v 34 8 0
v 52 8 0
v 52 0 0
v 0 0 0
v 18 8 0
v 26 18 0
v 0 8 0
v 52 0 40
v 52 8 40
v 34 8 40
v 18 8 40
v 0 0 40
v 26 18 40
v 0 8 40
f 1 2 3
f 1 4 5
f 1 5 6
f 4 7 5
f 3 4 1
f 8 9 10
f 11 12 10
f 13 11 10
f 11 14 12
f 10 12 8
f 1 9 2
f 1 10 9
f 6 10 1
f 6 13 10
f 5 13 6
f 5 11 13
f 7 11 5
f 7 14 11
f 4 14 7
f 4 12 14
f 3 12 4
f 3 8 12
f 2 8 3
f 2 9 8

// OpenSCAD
$fn = 32;

// ----------------------------------------------------------------------
// V guide rail: vrib, 52 mm wide
// ----------------------------------------------------------------------

// --- parameters (mm) ---
rail_w = 52;              // rail width, X
base_t = 8;               // base plate thickness
v_depth = 10;             // V feature depth / height
v_half_w = 8;             // half width of the V at the base face
plate_t = 40;             // rail length, Z (the extrusion height)

profile = [[0, 0], [52, 0], [52, 8], [34, 8], [26, 18], [18, 8], [0, 8]];  // primary outline, 7 points, counter clockwise

// --- the one profile operation ---
linear_extrude(height = plate_t) polygon(points = profile);
